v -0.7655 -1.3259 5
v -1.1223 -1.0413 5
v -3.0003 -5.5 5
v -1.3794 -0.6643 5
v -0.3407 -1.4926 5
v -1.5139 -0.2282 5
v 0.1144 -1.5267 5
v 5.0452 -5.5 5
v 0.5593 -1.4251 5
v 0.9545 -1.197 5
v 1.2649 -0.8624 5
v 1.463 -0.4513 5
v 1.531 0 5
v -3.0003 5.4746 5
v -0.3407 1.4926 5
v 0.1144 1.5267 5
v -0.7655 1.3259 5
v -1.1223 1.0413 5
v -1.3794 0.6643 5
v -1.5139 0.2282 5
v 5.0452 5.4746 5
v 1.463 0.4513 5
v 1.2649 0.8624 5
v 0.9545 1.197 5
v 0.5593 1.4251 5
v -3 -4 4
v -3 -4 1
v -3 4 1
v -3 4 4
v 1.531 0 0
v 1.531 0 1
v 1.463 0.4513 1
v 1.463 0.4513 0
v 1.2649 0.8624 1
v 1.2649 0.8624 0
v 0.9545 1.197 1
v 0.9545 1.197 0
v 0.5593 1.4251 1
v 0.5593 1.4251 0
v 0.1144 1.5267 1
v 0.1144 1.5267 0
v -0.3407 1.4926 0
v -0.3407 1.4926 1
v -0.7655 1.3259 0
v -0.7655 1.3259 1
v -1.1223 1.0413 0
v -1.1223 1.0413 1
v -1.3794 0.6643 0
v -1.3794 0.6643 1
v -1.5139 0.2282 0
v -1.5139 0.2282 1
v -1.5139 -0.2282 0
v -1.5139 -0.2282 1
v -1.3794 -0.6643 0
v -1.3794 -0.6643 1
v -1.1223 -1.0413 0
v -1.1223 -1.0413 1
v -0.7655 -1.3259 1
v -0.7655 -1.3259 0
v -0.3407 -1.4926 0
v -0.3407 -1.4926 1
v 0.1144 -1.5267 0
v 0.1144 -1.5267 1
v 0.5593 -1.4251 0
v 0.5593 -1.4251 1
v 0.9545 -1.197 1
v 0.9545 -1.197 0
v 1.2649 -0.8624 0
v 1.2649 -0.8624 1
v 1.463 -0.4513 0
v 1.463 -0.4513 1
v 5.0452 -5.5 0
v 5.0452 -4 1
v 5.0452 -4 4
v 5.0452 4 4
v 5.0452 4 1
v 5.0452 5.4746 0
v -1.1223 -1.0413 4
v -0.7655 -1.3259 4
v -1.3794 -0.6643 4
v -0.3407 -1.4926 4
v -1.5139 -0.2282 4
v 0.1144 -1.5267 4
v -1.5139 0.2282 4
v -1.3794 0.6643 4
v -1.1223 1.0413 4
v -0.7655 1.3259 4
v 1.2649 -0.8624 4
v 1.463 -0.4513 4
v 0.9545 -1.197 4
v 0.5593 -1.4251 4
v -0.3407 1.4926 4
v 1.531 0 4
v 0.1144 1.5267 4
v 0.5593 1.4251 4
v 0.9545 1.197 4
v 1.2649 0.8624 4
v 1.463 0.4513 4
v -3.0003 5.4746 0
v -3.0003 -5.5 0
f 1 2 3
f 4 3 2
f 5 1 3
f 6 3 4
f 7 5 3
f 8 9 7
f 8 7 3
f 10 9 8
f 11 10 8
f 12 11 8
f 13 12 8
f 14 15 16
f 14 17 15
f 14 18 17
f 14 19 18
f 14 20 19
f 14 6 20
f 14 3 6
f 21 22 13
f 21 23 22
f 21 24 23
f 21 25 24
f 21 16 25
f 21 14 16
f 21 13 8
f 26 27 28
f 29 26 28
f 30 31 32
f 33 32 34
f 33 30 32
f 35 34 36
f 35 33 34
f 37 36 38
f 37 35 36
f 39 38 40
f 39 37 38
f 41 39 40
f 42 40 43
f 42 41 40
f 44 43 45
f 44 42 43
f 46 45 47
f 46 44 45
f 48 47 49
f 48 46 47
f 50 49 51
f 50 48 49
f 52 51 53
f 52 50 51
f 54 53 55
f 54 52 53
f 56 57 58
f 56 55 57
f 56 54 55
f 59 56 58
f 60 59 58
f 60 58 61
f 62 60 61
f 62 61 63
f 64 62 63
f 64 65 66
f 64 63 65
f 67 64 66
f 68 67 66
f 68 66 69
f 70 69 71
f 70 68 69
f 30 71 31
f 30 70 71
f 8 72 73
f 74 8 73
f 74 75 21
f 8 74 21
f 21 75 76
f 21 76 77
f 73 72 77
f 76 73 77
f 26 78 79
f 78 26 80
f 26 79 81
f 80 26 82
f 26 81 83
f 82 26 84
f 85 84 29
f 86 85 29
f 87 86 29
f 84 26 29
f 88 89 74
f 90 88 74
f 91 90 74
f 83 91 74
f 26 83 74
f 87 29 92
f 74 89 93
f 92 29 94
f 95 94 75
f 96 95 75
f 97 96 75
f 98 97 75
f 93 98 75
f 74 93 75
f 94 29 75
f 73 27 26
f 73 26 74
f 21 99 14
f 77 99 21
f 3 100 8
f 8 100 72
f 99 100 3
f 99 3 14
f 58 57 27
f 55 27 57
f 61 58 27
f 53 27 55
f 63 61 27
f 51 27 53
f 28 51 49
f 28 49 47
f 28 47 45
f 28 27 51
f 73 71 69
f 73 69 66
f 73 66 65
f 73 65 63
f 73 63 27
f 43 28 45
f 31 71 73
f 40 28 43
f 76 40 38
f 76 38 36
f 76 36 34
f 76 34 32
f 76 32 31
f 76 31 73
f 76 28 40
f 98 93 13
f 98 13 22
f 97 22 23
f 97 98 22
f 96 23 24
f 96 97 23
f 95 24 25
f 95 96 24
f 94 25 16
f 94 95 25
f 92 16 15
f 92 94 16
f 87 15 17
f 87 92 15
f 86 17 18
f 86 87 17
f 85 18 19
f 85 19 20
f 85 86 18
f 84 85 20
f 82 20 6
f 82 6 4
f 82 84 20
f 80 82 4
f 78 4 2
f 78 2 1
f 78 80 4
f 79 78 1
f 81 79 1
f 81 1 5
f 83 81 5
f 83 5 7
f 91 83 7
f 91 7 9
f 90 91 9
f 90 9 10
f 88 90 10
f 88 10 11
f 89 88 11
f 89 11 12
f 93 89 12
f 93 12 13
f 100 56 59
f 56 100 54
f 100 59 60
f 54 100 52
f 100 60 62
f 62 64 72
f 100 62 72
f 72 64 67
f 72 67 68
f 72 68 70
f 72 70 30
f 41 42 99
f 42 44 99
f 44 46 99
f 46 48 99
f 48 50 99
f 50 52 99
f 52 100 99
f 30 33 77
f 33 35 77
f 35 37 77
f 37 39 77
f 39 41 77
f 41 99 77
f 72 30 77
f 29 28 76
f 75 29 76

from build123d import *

# Parameters (mm, degrees)
BOX009_W     = 8.5
BOX009_H     = 8
BOX009_DEPTH = 3
SKETCH013_W  = 8.045495
SKETCH013_H  = 10.974572
SKETCH013_R  = 1.530969
PAD013_DEPTH = 5


with BuildPart() as body059:
    # Box009 → Box009 (new body)
    with BuildSketch(Plane(origin=(-3, -4, 1), x_dir=(1, 0, 0), z_dir=(0, 0, 1))):
        with Locations((4.25, 4)):
            Rectangle(BOX009_W, BOX009_H)
    extrude(amount=BOX009_DEPTH)


with BuildPart() as body059_1:
    # BaseFeature015 placement: moved
    add(body059.part.moved(Location((3, 4, -1))))


with BuildPart() as body059_2:
    # Body059 placement: moved
    add(body059_1.part.moved(Location((-3, -4, 1))))


with BuildPart() as cut011:
    # Sketch013 → Pad013 (new body)
    with BuildSketch(Plane.XY):
        with Locations((1.022447, -0.012719)):
            Rectangle(SKETCH013_W, SKETCH013_H)
        Circle(SKETCH013_R, mode=Mode.SUBTRACT)
    extrude(amount=PAD013_DEPTH)

    # Cut011: cut Body059
    add(body059_2.part, mode=Mode.SUBTRACT)


solid = cut011.part
